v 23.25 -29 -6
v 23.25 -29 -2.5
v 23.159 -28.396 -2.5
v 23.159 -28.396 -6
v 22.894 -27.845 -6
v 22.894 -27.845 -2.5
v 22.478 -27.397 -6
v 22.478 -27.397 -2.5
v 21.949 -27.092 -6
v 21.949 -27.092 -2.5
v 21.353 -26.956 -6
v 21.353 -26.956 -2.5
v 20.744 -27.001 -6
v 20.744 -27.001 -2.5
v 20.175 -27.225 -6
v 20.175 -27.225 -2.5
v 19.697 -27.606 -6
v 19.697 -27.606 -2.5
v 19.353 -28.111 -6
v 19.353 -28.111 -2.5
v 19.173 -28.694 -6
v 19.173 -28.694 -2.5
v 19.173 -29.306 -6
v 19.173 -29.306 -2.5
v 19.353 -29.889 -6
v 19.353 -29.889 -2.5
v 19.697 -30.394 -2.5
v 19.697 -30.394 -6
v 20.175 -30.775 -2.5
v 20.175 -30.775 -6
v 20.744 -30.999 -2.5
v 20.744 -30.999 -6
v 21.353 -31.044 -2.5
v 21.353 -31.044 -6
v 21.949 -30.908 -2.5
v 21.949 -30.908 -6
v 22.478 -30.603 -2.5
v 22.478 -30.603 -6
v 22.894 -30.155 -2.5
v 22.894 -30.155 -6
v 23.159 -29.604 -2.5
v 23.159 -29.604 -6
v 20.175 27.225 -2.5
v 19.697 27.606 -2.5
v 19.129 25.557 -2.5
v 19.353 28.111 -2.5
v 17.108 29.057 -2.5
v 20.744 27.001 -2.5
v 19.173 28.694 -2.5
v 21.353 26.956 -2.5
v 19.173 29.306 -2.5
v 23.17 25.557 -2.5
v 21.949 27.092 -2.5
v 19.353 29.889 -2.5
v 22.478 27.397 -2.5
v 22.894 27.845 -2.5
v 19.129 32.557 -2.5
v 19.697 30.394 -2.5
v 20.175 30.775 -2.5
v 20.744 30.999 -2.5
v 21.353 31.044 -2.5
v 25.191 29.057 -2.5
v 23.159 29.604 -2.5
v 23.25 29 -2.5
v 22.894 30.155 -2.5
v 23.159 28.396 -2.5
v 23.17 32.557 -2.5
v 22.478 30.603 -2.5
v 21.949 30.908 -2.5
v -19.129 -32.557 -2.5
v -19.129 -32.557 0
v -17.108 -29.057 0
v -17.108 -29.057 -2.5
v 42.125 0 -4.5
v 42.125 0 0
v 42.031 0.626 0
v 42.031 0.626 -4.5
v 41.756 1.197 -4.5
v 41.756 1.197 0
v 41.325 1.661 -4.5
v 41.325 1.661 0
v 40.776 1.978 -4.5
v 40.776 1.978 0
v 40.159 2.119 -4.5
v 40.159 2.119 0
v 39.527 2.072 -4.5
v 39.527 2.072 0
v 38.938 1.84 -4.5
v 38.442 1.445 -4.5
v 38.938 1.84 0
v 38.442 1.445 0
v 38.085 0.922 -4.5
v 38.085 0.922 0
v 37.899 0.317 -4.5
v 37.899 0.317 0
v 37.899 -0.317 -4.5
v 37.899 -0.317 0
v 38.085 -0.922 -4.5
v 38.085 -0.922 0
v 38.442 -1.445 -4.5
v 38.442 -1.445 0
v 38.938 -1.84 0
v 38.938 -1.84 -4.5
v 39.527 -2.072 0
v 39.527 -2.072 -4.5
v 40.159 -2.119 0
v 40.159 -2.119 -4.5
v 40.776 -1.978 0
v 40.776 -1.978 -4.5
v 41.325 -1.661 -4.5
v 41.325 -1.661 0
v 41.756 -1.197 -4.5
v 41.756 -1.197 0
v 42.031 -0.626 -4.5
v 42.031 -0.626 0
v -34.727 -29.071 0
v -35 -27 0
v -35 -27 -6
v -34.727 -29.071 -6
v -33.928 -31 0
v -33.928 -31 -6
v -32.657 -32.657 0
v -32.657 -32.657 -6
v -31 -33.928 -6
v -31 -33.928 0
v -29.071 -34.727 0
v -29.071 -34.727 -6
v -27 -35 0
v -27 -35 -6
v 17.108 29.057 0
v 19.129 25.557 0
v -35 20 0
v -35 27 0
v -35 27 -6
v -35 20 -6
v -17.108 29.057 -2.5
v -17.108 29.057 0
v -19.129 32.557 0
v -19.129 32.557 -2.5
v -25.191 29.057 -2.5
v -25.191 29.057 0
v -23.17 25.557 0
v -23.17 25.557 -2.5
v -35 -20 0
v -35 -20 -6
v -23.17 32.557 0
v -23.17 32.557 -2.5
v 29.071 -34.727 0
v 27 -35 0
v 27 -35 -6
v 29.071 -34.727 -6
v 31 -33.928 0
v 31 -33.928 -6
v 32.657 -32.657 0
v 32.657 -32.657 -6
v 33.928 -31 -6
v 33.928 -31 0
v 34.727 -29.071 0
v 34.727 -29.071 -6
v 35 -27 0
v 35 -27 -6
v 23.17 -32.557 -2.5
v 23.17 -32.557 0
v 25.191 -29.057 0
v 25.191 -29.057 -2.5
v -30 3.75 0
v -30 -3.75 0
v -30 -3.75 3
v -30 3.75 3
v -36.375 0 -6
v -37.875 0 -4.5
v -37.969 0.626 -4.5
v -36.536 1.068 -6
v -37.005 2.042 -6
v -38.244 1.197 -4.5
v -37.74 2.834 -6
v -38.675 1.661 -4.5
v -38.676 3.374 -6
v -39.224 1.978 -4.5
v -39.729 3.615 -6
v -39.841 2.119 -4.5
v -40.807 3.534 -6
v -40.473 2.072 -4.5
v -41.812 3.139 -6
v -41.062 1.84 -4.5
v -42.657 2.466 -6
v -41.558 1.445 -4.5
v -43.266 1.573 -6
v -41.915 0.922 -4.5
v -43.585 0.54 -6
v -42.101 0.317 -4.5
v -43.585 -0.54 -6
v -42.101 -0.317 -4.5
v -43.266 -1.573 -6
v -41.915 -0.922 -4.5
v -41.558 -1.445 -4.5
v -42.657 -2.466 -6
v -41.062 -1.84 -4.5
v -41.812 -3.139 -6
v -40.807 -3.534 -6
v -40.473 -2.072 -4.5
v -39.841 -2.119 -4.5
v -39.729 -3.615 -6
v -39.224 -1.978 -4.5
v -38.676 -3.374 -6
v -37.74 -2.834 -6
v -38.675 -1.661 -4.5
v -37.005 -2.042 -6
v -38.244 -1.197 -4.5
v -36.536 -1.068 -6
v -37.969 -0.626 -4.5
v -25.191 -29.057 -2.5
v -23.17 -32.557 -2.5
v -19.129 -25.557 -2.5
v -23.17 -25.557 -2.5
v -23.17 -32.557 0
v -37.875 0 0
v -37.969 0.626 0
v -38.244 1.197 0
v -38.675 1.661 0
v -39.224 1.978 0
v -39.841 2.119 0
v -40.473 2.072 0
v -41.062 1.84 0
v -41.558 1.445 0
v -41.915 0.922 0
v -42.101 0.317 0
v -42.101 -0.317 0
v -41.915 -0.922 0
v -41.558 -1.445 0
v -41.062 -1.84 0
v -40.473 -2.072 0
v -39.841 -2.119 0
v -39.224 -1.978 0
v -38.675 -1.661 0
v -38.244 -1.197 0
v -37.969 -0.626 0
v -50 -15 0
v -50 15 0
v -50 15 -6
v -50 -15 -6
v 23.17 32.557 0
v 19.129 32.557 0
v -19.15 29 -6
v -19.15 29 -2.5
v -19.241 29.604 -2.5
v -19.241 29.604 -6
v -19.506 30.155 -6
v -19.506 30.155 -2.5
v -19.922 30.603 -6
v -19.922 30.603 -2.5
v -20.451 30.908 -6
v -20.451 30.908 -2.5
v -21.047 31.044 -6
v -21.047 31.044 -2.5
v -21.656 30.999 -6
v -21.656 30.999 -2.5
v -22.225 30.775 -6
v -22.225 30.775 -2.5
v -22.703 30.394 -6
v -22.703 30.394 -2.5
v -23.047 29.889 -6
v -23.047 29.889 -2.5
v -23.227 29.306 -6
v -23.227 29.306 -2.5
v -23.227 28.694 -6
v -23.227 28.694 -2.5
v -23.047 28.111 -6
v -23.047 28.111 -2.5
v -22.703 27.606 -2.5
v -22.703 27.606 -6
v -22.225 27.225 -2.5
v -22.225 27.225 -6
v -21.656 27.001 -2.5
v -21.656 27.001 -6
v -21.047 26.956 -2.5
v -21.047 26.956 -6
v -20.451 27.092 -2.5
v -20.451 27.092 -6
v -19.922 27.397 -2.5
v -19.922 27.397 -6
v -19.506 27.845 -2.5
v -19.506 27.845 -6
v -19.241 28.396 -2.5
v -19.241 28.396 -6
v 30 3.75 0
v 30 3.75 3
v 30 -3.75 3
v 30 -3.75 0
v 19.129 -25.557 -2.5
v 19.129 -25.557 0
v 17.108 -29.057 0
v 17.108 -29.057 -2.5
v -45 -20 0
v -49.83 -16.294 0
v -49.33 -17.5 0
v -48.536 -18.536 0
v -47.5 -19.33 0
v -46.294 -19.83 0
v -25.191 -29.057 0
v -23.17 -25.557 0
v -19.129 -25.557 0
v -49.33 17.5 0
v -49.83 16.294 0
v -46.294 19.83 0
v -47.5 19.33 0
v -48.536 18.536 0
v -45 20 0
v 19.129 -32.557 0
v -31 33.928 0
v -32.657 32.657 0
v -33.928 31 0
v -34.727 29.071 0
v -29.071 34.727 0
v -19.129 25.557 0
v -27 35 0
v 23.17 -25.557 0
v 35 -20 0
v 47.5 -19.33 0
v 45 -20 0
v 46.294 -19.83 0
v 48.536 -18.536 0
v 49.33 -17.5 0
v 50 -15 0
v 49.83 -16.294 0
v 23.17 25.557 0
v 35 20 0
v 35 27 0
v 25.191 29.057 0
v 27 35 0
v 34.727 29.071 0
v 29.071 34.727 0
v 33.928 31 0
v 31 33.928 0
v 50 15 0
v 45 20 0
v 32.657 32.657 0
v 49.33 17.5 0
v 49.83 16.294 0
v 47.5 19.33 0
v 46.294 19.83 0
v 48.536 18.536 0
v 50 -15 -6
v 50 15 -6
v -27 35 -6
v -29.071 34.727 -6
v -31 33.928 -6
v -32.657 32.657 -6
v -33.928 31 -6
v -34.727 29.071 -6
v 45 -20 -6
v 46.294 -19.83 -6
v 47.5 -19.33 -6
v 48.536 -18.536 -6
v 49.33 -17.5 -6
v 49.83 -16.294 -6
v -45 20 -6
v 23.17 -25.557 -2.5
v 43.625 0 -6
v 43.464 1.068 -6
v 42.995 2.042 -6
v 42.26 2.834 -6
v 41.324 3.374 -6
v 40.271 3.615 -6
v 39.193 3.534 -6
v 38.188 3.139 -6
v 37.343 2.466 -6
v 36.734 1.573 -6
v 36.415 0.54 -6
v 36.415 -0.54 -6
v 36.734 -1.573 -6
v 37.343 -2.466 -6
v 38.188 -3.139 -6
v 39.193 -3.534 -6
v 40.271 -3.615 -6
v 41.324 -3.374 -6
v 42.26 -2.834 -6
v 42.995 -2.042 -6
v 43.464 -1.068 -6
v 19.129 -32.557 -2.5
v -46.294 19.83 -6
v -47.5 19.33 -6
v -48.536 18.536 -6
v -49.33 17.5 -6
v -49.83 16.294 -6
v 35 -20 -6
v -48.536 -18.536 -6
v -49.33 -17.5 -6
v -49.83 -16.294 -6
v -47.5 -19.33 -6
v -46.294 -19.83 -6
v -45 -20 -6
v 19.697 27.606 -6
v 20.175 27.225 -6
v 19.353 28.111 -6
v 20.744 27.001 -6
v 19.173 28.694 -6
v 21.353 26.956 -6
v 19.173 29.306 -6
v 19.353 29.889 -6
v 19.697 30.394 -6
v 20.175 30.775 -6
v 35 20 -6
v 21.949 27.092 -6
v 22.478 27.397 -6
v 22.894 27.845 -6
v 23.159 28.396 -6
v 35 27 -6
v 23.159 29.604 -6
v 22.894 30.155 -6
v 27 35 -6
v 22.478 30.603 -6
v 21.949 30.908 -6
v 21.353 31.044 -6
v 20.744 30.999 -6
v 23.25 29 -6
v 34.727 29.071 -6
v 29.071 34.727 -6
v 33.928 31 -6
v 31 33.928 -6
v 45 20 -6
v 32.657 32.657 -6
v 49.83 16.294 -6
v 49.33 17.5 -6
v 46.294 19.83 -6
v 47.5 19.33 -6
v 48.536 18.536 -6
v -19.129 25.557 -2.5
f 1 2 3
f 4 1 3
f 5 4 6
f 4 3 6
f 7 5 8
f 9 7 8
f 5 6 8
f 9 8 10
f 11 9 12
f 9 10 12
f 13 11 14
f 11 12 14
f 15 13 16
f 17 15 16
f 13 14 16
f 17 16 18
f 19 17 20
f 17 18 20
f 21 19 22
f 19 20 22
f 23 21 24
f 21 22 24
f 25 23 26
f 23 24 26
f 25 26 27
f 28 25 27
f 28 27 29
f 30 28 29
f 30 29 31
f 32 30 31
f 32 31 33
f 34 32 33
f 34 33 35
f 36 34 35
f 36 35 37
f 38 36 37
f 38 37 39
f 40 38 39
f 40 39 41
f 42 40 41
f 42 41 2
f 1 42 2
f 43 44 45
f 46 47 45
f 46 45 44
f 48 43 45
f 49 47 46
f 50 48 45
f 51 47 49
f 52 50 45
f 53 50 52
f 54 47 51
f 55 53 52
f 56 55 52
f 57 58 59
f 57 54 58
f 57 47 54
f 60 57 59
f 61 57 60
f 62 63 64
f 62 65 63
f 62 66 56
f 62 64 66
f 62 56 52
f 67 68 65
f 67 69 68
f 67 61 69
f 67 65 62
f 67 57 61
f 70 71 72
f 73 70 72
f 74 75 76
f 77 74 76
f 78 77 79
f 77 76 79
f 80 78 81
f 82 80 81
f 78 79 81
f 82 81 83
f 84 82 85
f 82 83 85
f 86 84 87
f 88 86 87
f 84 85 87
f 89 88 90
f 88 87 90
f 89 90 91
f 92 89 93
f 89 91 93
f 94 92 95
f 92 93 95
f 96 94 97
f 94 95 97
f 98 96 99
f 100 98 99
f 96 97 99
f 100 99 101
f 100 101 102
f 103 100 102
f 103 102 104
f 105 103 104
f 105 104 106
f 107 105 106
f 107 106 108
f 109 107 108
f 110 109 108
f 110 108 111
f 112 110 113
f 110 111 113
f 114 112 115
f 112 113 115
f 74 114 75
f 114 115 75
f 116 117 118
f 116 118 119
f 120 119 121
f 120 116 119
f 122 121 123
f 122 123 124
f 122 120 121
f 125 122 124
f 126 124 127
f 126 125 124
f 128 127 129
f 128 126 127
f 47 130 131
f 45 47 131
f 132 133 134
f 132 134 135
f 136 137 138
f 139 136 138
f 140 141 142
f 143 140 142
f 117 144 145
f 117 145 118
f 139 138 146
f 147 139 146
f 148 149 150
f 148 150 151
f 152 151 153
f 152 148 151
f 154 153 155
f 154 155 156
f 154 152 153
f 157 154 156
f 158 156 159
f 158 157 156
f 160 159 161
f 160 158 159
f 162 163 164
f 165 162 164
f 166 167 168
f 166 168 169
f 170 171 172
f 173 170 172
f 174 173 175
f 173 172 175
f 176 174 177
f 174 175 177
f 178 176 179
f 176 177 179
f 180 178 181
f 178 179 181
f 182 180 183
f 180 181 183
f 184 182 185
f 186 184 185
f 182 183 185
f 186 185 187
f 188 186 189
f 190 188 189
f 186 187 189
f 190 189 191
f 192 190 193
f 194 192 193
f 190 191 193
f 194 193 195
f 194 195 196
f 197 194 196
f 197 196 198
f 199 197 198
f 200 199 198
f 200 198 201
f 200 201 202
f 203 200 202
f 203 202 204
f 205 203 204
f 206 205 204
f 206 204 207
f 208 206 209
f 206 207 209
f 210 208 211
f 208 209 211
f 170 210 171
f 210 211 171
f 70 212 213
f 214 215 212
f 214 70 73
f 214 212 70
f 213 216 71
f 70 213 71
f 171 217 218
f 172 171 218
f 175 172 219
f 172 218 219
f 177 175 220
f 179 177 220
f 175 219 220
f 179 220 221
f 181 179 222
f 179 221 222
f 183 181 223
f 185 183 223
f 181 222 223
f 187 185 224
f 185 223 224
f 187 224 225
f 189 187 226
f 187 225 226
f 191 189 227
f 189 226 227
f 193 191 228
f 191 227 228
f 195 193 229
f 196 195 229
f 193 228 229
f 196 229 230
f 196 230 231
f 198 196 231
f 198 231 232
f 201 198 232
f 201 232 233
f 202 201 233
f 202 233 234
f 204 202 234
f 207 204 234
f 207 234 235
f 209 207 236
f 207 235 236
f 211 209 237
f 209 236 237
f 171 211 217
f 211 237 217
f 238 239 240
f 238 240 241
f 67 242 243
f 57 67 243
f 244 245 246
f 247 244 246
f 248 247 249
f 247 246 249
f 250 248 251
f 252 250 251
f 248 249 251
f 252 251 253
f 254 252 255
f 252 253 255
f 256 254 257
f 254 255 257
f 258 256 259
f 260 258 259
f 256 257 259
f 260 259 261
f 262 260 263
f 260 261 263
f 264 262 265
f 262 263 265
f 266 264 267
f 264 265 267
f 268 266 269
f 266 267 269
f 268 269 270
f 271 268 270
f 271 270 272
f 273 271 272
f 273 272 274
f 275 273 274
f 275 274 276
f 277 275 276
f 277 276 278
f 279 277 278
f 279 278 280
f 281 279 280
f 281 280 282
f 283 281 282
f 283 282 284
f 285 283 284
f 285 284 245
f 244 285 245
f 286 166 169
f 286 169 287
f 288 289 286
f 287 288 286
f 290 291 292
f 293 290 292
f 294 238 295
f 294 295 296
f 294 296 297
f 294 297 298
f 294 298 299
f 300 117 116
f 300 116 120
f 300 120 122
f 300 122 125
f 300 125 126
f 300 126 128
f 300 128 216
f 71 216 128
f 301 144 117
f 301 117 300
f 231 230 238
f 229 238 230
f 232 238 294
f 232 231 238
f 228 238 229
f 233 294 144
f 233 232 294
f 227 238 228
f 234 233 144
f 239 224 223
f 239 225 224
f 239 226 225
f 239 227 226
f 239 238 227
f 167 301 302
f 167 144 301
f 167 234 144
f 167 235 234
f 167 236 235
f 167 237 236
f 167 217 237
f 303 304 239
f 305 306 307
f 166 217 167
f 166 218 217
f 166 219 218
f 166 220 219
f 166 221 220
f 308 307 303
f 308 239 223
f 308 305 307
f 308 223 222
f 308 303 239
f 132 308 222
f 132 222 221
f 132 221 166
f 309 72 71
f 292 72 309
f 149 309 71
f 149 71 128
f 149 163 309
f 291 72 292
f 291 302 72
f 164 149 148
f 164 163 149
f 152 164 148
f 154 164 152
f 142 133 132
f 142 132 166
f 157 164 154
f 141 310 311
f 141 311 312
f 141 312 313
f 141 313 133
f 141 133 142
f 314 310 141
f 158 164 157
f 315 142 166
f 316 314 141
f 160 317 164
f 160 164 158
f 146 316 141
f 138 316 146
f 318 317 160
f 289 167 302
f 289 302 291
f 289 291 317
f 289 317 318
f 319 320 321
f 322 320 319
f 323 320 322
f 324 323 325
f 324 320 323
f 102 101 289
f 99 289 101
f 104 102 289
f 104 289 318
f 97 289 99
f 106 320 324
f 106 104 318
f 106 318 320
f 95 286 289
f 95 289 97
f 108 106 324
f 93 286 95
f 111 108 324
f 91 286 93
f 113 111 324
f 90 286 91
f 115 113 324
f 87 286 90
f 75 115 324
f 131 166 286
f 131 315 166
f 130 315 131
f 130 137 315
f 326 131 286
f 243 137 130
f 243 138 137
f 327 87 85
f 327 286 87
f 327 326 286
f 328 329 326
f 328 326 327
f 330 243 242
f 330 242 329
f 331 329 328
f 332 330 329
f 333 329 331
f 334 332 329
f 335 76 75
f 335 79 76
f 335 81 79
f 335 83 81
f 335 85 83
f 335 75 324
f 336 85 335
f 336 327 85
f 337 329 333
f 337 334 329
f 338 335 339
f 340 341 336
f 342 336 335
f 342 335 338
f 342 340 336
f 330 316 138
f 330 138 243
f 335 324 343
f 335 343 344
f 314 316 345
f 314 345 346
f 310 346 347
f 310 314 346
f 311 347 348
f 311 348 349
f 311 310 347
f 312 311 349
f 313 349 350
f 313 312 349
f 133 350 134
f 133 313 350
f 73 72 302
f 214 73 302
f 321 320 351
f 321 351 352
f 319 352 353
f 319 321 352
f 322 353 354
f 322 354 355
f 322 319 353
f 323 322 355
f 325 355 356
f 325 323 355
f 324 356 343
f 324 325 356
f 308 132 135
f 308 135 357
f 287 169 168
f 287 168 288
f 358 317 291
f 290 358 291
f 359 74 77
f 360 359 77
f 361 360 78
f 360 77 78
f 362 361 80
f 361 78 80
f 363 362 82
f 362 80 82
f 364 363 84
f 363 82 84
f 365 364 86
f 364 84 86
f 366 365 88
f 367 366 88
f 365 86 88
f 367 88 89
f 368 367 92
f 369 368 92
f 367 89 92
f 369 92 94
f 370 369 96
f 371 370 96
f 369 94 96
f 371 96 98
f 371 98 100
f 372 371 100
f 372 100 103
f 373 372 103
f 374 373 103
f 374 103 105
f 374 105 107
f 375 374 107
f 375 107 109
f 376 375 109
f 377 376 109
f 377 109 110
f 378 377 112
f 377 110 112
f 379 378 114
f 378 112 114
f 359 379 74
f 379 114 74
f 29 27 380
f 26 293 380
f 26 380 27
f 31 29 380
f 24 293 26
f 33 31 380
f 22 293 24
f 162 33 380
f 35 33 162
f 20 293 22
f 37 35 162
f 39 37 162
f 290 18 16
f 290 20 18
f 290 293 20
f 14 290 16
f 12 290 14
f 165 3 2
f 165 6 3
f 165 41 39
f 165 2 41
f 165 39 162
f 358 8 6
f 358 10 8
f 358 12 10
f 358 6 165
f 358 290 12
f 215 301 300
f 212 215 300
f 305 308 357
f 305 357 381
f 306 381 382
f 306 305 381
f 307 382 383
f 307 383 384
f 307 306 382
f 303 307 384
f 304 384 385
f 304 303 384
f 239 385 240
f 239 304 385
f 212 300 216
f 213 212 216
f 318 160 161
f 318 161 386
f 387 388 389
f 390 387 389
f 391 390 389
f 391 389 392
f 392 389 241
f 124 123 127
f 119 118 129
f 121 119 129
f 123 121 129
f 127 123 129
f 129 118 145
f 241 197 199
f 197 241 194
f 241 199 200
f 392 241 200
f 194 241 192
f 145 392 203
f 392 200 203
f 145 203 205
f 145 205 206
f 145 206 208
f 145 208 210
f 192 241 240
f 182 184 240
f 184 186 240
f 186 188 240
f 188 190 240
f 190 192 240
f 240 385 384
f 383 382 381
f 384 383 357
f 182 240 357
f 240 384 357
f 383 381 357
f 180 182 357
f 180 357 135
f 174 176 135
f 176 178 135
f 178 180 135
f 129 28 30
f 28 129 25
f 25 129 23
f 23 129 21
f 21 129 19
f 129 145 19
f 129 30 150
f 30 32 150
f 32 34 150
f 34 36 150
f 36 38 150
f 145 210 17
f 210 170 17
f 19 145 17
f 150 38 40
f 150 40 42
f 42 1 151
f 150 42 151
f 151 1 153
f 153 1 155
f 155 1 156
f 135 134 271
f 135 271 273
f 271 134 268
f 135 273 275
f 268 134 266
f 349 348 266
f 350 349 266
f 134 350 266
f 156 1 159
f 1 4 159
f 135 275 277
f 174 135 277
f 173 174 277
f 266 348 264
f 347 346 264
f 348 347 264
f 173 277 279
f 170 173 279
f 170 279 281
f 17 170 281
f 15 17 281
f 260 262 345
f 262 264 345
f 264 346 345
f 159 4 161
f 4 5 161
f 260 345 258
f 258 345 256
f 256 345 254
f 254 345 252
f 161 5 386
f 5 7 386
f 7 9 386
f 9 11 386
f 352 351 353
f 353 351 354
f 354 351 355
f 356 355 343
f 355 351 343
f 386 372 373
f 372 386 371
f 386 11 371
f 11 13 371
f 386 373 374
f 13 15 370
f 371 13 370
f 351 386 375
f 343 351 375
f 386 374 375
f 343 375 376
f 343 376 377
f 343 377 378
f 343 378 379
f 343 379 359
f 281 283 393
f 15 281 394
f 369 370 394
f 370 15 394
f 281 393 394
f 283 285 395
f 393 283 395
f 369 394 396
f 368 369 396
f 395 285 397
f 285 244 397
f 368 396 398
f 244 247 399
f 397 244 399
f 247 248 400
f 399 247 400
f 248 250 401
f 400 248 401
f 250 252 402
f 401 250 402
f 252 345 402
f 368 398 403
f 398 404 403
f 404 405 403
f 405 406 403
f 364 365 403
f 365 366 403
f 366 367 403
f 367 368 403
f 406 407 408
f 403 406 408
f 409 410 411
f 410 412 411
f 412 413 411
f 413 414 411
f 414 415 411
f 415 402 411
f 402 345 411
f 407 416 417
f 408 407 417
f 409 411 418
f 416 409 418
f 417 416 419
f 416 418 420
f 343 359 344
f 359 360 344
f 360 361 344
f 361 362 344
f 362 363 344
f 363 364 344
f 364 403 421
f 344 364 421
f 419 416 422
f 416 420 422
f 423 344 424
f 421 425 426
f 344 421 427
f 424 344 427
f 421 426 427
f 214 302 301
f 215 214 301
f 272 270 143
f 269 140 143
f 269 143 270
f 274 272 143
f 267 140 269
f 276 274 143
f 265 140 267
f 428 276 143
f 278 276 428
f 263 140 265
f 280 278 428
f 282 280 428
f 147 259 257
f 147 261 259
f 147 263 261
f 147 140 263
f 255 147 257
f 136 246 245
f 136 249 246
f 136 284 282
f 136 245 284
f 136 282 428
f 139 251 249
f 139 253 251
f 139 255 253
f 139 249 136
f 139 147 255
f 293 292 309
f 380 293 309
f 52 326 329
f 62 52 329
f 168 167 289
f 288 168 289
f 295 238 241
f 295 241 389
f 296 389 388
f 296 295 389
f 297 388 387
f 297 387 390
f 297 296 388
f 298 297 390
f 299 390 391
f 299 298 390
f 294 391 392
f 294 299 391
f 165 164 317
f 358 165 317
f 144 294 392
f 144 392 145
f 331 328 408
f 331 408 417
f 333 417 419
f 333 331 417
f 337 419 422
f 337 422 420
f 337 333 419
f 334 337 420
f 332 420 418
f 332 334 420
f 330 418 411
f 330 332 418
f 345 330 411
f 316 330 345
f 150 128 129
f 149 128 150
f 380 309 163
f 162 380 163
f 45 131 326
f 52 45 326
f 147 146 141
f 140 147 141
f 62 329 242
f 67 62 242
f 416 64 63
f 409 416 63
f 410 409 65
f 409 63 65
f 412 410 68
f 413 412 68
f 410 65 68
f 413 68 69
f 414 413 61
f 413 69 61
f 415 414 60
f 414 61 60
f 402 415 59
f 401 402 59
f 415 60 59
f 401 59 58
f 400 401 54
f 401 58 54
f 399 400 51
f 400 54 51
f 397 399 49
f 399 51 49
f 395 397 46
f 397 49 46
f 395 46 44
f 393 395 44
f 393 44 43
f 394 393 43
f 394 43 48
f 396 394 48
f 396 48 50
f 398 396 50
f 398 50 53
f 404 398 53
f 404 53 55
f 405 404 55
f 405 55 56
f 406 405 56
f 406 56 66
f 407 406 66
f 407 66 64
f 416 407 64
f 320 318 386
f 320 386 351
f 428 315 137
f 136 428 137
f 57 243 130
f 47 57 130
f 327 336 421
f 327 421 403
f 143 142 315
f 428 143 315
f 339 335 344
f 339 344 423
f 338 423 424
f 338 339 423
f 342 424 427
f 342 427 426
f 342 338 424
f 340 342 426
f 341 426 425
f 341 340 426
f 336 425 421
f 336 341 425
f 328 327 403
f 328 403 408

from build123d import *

# Parameters (mm, degrees)
F0_W     = 70
F0_H     = 40
F0_W_2   = 60
F0_H_2   = 7.5
F0_R     = 2.05
F0_R_2   = 2.125
F1_DEPTH = 6
F2_DEPTH = 3
F3_SIZE  = 1.5
F5_DEPTH = 2.5


with BuildPart() as f1:
    # F0 (on Top) → F1 (new body)
    with BuildSketch(Plane.XY):
        Rectangle(F0_W, F0_H)
        Rectangle(F0_W_2, F0_H_2, mode=Mode.SUBTRACT)
        with BuildLine():
            ThreePointArc((35, 27), (32.6568542495, 32.6568542495), (27, 35))
            Line((27, 35), (-27, 35))
            ThreePointArc((-27, 35), (-32.6568542495, 32.6568542495), (-35, 27))
            Line((-35, 27), (-35, 20))
            Line((-35, 20), (35, 20))
            Line((35, 20), (35, 27))
        make_face()
        with Locations((-21.2, 29)):
            Circle(F0_R, mode=Mode.SUBTRACT)
        with Locations((21.2, 29)):
            Circle(F0_R, mode=Mode.SUBTRACT)
        with BuildLine():
            Line((35, -27), (35, -20))
            Line((35, -20), (-35, -20))
            Line((-35, -20), (-35, -27))
            ThreePointArc((-35, -27), (-32.6568542495, -32.6568542495), (-27, -35))
            Line((-27, -35), (27, -35))
            ThreePointArc((27, -35), (32.6568542495, -32.6568542495), (35, -27))
        make_face()
        with Locations((-21.2, -29)):
            Circle(F0_R, mode=Mode.SUBTRACT)
        with Locations((21.2, -29)):
            Circle(F0_R, mode=Mode.SUBTRACT)
        with BuildLine():
            Line((45, 20), (35, 20))
            Line((35, 20), (35, -20))
            Line((35, -20), (45, -20))
            ThreePointArc((45, -20), (48.5355339059, -18.5355339059), (50, -15))
            Line((50, -15), (50, 15))
            ThreePointArc((50, 15), (48.5355339059, 18.5355339059), (45, 20))
        make_face()
        with Locations((40, 0)):
            Circle(F0_R_2, mode=Mode.SUBTRACT)
        with BuildLine():
            Line((-35, -20), (-35, 20))
            Line((-35, 20), (-45, 20))
            ThreePointArc((-45, 20), (-48.5355339059, 18.5355339059), (-50, 15))
            Line((-50, 15), (-50, -15))
            ThreePointArc((-50, -15), (-48.5355339059, -18.5355339059), (-45, -20))
            Line((-45, -20), (-35, -20))
        make_face()
        with Locations((-40, 0)):
            Circle(F0_R_2, mode=Mode.SUBTRACT)
        Rectangle(F0_W_2, F0_H_2)
        with Locations((-21.2, -29)):
            Circle(F0_R)
    extrude(amount=-F1_DEPTH)

    # F0 (on Top) → F2 (join)
    with BuildSketch(Plane.XY):
        Rectangle(F0_W_2, F0_H_2)
    extrude(amount=F2_DEPTH)

    # F3
    f3_edges = [f1.edges().sort_by_distance(p)[0] for p in [
        (-42.125, 0, -6),
        (37.875, 0, -6),
    ]]
    chamfer(f3_edges, length=F3_SIZE)

    # F4 (on Top) → F5 (cut)
    with BuildSketch(Plane.XY):
        Polygon((19.1289578016, -32.5574766695), (23.1704096859, -32.5574766695), (25.191135628, -29.0574766695), (23.1704096859, -25.5574766695), (19.1289578016, -25.5574766695), (17.1082318594, -29.0574766695), align=None)
        Polygon((-17.1082318594, -29.0574766695), (-19.1289578016, -25.5574766695), (-23.1704096859, -25.5574766695), (-25.191135628, -29.0574766695), (-23.1704096859, -32.5574766695), (-19.1289578016, -32.5574766695), align=None)
        Polygon((-23.1704096859, 25.5574766695), (-19.1289578016, 25.5574766695), (-17.1082318594, 29.0574766695), (-19.1289578016, 32.5574766695), (-23.1704096859, 32.5574766695), (-25.191135628, 29.0574766695), align=None)
        Polygon((19.1289578016, 32.5574766695), (17.1082318594, 29.0574766695), (19.1289578016, 25.5574766695), (23.1704096859, 25.5574766695), (25.191135628, 29.0574766695), (23.1704096859, 32.5574766695), align=None)
    extrude(amount=-F5_DEPTH, mode=Mode.SUBTRACT)


solid = f1.part
